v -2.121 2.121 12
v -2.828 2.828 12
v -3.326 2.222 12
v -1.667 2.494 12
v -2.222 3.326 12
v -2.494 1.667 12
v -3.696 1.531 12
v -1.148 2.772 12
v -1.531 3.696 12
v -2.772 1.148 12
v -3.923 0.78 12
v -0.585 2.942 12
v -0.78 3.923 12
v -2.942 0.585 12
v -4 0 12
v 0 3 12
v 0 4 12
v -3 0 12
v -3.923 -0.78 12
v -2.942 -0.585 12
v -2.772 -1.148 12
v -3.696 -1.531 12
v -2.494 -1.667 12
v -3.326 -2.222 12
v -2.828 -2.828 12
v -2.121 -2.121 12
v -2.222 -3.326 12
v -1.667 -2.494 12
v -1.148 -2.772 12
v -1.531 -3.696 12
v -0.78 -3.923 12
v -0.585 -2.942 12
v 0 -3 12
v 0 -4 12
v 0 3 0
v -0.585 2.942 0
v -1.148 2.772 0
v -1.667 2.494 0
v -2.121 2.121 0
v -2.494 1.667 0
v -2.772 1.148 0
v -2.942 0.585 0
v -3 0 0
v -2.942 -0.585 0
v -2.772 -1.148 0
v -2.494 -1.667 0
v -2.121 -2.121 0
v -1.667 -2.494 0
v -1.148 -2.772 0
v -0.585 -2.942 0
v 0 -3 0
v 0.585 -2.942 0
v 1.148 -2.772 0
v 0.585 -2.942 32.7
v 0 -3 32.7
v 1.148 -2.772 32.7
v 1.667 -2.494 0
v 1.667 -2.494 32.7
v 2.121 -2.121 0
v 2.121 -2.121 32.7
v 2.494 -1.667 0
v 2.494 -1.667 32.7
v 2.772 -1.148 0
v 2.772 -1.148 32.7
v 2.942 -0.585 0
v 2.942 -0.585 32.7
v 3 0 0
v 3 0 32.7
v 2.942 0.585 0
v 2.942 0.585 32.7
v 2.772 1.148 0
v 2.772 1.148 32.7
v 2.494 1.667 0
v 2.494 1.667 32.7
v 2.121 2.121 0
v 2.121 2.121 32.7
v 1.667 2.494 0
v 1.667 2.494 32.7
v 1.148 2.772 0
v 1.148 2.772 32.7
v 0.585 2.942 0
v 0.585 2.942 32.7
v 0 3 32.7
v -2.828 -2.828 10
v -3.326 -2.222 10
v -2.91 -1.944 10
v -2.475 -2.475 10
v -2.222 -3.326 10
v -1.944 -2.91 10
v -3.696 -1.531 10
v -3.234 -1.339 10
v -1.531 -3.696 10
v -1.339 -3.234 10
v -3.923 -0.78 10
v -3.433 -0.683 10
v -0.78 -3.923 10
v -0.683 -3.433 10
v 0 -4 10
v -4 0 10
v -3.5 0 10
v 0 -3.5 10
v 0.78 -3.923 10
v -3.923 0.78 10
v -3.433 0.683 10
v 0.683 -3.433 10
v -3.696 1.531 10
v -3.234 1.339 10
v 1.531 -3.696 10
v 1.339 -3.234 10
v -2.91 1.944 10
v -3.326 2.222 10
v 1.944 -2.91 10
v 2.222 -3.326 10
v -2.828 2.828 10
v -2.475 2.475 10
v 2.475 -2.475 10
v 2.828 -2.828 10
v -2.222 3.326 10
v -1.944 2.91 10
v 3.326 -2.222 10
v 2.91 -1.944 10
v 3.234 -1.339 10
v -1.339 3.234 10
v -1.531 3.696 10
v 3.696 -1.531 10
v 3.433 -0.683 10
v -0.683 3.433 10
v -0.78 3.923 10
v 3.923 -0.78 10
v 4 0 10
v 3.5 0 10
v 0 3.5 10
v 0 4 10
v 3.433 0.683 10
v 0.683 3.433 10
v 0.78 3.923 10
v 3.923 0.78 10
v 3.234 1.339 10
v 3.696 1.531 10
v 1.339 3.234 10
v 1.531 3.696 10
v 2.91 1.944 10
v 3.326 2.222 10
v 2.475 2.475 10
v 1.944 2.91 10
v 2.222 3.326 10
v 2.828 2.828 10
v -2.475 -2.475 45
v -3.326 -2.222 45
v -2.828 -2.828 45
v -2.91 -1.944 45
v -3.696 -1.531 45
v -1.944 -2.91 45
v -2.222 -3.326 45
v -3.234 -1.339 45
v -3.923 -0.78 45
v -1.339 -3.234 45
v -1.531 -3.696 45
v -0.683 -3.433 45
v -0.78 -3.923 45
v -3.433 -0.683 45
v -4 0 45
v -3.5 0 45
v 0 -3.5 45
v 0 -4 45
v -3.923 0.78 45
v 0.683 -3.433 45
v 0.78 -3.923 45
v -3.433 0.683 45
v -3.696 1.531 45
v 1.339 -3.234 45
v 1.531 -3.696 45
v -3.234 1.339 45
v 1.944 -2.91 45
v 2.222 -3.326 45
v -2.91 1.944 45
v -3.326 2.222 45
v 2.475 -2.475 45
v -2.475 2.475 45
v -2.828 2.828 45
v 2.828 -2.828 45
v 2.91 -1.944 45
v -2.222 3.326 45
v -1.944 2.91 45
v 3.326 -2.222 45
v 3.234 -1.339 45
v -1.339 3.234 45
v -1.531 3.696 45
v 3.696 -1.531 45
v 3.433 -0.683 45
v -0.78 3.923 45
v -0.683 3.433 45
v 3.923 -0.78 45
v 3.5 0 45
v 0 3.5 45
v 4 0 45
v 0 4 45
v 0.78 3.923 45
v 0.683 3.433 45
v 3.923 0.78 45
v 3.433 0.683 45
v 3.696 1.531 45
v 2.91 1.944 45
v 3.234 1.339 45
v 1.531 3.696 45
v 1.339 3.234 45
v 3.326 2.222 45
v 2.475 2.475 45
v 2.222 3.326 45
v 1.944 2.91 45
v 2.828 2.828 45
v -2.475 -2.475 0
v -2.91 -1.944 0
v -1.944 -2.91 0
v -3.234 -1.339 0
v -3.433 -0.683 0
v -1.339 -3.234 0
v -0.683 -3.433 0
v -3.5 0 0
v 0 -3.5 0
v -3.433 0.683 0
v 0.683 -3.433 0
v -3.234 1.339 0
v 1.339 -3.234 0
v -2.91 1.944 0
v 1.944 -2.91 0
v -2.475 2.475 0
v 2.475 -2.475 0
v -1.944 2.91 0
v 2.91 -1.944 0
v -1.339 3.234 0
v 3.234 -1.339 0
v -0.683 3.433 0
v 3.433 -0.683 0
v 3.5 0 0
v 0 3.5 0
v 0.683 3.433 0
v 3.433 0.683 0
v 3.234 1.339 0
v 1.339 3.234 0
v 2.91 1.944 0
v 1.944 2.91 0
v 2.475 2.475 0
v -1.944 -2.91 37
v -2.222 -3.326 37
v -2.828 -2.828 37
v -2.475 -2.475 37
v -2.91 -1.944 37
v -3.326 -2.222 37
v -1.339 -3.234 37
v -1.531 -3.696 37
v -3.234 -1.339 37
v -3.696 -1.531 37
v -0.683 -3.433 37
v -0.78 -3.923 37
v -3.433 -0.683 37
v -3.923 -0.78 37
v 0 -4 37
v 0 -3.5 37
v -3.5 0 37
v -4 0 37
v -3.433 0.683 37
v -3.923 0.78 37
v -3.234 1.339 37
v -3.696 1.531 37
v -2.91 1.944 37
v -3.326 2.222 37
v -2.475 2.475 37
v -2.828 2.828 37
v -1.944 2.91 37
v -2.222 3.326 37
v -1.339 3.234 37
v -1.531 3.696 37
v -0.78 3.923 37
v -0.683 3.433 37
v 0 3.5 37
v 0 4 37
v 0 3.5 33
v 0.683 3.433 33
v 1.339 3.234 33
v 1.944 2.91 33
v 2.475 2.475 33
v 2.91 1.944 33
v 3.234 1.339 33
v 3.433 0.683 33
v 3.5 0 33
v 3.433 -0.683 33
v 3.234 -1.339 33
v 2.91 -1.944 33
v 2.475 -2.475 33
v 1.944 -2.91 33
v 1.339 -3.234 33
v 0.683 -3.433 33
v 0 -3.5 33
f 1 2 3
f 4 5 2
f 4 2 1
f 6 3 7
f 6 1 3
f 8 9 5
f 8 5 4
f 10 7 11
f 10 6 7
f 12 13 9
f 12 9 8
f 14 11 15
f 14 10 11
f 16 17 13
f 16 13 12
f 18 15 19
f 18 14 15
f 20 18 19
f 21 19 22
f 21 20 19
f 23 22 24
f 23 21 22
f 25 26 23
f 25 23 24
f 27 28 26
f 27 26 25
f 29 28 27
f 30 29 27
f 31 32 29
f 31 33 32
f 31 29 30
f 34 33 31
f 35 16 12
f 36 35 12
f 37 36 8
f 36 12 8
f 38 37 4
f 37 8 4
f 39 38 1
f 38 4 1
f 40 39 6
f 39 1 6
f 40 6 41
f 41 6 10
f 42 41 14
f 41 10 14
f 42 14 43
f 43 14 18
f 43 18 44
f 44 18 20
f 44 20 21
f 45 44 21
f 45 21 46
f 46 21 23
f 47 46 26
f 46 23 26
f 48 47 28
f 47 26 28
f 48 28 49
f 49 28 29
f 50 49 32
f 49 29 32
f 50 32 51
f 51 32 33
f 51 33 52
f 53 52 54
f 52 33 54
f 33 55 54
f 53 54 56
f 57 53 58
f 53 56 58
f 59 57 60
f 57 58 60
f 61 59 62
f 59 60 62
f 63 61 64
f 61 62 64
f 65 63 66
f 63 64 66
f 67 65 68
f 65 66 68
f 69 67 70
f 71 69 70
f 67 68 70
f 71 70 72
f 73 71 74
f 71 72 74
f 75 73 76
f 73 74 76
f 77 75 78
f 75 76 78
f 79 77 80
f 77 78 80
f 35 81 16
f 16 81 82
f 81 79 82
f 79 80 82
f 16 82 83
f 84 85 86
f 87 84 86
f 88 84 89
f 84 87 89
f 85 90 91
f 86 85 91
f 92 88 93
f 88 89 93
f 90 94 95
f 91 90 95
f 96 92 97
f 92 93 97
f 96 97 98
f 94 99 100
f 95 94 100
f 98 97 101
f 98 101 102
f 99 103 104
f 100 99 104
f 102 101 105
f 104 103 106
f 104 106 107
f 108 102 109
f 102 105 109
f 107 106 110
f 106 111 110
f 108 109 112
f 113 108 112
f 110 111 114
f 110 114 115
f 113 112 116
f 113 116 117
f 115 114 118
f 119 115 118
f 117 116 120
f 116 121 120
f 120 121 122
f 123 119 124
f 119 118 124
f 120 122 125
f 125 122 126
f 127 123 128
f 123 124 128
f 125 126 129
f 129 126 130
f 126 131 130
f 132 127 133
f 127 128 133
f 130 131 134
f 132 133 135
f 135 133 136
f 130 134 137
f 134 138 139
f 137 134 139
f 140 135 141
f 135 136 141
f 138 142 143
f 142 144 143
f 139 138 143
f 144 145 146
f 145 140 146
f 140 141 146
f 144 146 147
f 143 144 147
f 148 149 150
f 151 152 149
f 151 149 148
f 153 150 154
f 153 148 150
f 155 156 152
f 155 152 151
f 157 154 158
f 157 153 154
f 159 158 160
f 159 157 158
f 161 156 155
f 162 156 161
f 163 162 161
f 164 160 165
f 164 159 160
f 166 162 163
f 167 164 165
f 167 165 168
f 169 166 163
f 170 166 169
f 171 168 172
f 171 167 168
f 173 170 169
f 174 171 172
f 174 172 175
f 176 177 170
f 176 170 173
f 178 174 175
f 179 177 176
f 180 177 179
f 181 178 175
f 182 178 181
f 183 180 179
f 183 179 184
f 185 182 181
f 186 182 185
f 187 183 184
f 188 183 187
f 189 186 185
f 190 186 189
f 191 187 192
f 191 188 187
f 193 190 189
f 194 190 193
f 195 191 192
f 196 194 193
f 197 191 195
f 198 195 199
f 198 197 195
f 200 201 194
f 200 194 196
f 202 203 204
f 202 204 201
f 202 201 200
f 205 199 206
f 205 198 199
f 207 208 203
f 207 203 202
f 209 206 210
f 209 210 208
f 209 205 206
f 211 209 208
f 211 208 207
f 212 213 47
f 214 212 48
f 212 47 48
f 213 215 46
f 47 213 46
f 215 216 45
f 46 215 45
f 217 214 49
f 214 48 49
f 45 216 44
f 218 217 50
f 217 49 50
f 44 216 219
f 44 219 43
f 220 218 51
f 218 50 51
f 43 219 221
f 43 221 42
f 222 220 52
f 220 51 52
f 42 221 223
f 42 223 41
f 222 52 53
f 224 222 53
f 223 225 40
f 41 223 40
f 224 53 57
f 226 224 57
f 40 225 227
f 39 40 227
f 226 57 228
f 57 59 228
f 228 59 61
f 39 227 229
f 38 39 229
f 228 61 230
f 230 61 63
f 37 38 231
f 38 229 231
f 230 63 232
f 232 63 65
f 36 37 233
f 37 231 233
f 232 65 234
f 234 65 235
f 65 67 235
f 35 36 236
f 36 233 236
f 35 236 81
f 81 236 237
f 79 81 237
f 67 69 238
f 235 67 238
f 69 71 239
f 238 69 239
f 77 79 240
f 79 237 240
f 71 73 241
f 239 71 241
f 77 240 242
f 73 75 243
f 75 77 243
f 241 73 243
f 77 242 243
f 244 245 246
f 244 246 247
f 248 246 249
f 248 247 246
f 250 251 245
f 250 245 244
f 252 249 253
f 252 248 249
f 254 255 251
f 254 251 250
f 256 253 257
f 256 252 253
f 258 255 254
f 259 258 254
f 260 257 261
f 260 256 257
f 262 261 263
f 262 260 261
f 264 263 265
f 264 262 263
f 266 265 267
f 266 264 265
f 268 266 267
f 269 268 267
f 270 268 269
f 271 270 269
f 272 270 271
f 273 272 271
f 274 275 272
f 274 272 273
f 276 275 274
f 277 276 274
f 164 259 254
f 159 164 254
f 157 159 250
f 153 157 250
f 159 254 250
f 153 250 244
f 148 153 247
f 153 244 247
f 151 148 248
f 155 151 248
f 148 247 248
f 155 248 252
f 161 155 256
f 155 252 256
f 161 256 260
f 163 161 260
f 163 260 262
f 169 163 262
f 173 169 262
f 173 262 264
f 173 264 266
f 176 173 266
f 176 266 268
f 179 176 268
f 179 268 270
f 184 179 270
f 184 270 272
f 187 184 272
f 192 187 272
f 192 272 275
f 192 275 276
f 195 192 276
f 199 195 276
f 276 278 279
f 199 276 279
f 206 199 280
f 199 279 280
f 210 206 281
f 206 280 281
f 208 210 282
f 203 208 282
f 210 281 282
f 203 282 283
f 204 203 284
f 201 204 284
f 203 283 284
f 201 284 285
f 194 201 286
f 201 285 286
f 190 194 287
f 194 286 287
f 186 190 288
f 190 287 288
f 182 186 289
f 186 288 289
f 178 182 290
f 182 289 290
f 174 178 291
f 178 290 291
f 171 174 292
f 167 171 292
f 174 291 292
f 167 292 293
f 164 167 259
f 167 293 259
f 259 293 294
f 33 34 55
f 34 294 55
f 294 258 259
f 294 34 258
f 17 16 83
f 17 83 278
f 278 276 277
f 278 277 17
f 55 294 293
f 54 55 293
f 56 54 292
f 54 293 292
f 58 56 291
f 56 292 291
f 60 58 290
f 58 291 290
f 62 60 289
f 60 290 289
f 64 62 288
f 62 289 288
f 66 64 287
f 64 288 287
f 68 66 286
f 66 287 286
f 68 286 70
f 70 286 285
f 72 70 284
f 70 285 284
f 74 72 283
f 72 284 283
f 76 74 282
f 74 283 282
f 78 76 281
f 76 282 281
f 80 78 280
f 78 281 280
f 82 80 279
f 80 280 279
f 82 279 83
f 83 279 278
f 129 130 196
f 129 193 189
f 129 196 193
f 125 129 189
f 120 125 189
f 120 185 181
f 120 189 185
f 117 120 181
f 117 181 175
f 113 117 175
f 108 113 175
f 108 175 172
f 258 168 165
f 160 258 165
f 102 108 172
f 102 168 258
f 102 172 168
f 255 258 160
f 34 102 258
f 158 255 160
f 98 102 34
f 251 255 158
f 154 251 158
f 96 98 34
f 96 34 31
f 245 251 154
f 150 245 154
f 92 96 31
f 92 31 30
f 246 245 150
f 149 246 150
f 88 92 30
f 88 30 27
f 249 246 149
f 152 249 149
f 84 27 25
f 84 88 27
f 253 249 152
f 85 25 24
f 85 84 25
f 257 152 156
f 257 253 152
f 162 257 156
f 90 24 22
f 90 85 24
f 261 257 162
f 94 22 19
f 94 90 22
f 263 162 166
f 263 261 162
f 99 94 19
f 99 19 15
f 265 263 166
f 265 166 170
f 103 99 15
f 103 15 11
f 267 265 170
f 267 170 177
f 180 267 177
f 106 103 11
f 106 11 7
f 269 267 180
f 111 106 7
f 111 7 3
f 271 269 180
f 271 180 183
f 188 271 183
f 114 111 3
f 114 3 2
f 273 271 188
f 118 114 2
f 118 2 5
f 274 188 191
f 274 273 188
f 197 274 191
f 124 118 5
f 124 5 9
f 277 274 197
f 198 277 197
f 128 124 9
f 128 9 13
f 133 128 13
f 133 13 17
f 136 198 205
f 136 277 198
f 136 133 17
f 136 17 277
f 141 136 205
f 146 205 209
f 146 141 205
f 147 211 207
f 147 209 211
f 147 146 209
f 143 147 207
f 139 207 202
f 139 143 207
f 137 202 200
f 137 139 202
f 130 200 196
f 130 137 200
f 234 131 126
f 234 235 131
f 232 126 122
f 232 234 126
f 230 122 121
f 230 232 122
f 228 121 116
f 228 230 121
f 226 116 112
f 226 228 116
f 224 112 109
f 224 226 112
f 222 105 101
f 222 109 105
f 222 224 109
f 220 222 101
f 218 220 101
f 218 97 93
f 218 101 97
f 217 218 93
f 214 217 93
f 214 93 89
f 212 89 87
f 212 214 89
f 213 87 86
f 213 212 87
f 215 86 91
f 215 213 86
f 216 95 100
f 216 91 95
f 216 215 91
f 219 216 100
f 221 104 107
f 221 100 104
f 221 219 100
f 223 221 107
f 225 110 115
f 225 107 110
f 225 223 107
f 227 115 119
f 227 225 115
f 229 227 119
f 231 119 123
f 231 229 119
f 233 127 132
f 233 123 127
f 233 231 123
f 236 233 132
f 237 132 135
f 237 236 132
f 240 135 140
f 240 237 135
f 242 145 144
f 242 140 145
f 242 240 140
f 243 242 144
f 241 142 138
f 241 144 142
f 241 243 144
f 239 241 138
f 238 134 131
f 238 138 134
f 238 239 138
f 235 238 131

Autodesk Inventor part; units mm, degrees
ref_plane "YZ Plane" through (0, 0, 0) normal (1, 0, 0) x (0, 1, 0)
ref_plane "XZ Plane" through (0, 0, 0) normal (0, 1, 0) x (-1, 0, 0)
ref_plane "XY Plane" through (0, 0, 0) normal (0, 0, 1) x (1, 0, 0)
sketch "Skizze1" plane through (0, 0, 0) normal (0, 0, 1) x (1, 0, 0)
  circle A0 centre (0, 0) radius 4
  circle A1 centre (0, 0) radius 3.5
  dimension "d0" = 8
  dimension "d23" = 7
extrude "Extrusion1" add sketch "Skizze1" along normal blind 45 contours A0 | A1
hole "Bohrung1" at (0, 0, 0) direction (0, 0, 1) diameter 6 end through all
extrude "Extrusion5" cut sketch "Skizze1" along normal blind 10
thread "Gewinde3" size "M7x0.5" class "6g" standard "ANSI Metric M Profile" full length
sketch "Skizze5" plane through (0, 0, 45) normal (0, 0, 1) x (1, 0, 0)
  circle A0 centre (0, 0) radius 4 projected
hole "Bohrung2" at (0, 0, 45) direction (0, 0, -1) diameter 7 depth 12 tip angle 118
thread "Gewinde4" size "M7x0.5" class "6H" standard "ANSI Metric M Profile" full length
sketch "Skizze6" plane through (0, 0, 0) normal (1, 0, 0) x (0, 1, 0)
  line L0 (5.1203, 12) -> (-6.2581, 12)
  line L1 (-6.2581, 12) -> (-6.2581, 37)
  line L2 (-6.2581, 37) -> (5.1203, 37)
  line L3 (5.1203, 37) -> (5.1203, 12)
  point P0 (0, 0)
  dimension "d37" = 25
extrude "Extrusion6" cut sketch "Skizze6" against normal blind 10
properties part number "PEEKAufsatz1" material "Polyaryletherketon-Kunststoff"
